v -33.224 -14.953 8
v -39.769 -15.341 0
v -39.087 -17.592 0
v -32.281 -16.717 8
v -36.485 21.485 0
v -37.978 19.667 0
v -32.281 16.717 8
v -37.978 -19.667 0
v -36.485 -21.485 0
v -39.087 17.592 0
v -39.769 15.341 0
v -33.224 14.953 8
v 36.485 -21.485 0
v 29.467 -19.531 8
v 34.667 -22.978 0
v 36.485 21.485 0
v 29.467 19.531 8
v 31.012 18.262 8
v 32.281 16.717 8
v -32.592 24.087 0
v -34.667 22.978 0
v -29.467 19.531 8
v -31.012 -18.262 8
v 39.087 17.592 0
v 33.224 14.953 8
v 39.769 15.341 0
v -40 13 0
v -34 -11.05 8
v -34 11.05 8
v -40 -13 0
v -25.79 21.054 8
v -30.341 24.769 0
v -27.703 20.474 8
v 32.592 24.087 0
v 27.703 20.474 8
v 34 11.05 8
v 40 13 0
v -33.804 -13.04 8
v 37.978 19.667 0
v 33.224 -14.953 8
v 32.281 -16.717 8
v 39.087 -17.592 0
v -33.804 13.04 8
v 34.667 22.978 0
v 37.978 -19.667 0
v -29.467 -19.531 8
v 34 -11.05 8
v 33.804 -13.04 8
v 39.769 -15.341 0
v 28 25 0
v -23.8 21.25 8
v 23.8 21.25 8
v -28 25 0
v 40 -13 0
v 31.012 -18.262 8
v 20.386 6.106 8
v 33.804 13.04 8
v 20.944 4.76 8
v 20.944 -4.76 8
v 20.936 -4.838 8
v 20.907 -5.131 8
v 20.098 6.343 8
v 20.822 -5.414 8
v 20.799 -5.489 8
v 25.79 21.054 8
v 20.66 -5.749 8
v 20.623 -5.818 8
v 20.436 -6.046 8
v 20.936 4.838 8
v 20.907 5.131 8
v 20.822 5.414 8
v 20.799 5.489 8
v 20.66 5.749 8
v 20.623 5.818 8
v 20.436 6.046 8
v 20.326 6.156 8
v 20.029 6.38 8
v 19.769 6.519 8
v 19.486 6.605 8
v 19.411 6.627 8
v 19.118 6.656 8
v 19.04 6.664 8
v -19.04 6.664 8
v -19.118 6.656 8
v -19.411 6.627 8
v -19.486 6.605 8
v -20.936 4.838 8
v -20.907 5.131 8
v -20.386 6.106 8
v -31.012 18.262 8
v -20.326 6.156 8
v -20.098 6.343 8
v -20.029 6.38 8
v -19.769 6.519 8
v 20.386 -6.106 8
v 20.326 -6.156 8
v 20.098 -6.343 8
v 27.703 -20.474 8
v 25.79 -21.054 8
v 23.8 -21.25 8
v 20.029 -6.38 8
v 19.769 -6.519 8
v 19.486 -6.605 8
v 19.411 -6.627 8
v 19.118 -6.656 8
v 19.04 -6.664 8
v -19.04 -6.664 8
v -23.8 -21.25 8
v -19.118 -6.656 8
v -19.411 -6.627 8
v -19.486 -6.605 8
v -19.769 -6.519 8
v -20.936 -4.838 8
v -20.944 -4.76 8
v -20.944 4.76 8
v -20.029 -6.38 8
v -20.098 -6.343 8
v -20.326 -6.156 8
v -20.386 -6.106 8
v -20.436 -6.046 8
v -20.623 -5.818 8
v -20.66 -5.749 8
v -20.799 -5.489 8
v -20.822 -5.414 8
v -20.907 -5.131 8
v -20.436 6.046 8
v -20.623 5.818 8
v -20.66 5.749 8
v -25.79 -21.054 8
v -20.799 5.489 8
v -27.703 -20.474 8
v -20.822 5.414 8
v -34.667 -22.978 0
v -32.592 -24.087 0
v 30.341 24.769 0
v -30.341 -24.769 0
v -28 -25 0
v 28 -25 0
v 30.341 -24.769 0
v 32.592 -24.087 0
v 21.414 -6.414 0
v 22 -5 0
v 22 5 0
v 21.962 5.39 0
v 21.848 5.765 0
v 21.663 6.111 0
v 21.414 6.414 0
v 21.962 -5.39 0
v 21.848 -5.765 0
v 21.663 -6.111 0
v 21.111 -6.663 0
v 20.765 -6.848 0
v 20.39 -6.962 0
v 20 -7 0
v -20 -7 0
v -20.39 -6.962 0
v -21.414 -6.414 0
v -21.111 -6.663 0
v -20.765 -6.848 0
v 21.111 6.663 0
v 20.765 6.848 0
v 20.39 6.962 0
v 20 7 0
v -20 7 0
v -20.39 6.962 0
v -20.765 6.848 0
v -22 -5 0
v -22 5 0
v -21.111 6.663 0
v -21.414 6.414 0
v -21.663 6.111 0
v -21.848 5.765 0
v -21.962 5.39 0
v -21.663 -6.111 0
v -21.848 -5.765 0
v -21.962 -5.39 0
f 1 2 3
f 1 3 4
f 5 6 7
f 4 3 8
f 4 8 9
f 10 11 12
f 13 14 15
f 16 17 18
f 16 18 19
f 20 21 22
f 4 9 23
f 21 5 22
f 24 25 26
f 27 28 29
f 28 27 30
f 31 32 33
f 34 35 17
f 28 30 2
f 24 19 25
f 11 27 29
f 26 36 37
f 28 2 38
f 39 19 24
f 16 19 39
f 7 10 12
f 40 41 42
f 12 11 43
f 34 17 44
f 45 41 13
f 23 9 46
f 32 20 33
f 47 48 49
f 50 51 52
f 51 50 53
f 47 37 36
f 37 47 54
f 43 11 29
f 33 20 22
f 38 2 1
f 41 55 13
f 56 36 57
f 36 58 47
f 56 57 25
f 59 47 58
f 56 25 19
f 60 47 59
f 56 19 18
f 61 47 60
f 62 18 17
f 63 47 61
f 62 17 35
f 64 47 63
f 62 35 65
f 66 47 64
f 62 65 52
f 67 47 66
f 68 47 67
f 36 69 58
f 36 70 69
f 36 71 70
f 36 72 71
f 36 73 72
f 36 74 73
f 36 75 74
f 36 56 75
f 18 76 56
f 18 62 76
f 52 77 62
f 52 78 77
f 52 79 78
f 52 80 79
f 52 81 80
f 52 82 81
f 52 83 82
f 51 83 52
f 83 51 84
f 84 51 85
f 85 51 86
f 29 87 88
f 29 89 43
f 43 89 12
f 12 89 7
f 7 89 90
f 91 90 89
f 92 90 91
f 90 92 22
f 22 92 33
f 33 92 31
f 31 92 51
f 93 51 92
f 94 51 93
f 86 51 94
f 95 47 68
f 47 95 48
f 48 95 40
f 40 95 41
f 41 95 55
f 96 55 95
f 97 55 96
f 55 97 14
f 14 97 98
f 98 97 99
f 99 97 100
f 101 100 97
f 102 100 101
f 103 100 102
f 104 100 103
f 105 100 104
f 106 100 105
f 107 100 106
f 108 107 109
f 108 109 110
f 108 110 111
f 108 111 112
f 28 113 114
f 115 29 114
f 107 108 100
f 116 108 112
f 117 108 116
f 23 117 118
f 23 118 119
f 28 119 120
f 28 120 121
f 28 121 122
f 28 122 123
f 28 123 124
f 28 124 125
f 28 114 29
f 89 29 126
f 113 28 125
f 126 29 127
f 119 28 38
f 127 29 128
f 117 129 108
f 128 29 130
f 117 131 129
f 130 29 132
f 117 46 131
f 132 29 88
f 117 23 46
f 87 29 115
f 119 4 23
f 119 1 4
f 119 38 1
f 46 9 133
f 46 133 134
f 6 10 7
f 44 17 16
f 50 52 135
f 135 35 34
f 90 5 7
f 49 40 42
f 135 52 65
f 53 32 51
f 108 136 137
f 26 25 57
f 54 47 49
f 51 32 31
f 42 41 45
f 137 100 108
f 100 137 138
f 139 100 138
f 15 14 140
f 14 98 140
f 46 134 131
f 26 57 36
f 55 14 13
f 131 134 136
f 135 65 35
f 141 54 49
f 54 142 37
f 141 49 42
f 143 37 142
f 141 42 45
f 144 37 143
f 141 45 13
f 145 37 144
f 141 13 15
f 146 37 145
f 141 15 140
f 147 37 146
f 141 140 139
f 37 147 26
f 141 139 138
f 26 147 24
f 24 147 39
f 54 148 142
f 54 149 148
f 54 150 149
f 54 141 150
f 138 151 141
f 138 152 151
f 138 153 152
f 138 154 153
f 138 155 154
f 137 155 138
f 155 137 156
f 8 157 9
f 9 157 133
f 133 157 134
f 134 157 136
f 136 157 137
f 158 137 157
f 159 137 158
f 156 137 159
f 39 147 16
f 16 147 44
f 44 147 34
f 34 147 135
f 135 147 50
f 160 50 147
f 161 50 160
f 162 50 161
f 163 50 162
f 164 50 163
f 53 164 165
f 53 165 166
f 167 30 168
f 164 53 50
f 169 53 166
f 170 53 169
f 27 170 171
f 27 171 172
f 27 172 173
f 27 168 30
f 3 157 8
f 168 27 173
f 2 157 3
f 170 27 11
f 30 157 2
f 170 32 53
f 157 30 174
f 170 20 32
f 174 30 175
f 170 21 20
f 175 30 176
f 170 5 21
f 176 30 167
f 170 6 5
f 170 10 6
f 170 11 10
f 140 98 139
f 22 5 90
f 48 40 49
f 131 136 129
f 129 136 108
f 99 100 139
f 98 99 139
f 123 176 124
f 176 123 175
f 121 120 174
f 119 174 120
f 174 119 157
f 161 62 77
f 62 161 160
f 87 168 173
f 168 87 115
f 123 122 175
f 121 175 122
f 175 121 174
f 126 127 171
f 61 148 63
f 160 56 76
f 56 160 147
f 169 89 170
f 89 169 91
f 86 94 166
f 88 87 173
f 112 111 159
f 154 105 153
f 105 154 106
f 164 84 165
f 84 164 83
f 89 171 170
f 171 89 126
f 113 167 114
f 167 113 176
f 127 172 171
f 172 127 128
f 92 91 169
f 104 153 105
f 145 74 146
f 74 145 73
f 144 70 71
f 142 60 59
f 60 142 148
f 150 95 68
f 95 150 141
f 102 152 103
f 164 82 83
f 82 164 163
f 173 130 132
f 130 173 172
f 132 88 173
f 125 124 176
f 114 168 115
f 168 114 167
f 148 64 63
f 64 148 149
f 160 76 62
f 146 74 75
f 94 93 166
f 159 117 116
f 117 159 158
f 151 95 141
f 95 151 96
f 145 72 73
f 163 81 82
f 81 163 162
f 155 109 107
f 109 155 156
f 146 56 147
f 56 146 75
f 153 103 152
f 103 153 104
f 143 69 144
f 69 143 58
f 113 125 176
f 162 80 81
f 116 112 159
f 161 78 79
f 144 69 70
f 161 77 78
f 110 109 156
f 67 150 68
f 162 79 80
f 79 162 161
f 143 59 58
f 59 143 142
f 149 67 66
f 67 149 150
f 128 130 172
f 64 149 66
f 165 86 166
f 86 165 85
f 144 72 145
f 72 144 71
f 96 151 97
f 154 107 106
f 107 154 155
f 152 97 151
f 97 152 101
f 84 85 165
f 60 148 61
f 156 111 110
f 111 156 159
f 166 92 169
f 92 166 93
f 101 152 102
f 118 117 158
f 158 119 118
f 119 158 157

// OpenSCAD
$fn = 32;

// ----------------------------------------------------------------------
// Display bezel: 80 x 50 mm frame, opening 44x14 mm
// ----------------------------------------------------------------------

// --- parameters (mm) ---
length = 80;              // frame outside length, X
width = 50;               // frame outside width, Y
frame_w = 18;             // frame width
thickness = 8;            // frame thickness
corner_r = 12;            // outside corner radius
chamfer = 0.85;           // outer wall taper
funnel = 0.94;            // inner opening taper
opening_l = 44;           // opening length
opening_w = 14;           // opening width
inner_r = 2;              // opening corner radius

/* rounded-rectangle outlines, generated with loops */
module rounded_ring(l_nom, w_nom, r) {
  hull() {
    for (sx = [-1, 1]) for (sy = [-1, 1])
      translate([sx * (l_nom / 2 - r), sy * (w_nom / 2 - r)]) circle(r = r);
  }
}

difference() {
  /* frame body, drafted so the outer edge is a variable-depth chamfer */
  linear_extrude(height = thickness, scale = chamfer)
    rounded_ring(length, width, corner_r);
  /* viewing opening, drafted the other way for a funnel edge */
  linear_extrude(height = thickness + 2, scale = funnel)
    translate([0, 0, -1]) rounded_ring(opening_l, opening_w, inner_r);
}
